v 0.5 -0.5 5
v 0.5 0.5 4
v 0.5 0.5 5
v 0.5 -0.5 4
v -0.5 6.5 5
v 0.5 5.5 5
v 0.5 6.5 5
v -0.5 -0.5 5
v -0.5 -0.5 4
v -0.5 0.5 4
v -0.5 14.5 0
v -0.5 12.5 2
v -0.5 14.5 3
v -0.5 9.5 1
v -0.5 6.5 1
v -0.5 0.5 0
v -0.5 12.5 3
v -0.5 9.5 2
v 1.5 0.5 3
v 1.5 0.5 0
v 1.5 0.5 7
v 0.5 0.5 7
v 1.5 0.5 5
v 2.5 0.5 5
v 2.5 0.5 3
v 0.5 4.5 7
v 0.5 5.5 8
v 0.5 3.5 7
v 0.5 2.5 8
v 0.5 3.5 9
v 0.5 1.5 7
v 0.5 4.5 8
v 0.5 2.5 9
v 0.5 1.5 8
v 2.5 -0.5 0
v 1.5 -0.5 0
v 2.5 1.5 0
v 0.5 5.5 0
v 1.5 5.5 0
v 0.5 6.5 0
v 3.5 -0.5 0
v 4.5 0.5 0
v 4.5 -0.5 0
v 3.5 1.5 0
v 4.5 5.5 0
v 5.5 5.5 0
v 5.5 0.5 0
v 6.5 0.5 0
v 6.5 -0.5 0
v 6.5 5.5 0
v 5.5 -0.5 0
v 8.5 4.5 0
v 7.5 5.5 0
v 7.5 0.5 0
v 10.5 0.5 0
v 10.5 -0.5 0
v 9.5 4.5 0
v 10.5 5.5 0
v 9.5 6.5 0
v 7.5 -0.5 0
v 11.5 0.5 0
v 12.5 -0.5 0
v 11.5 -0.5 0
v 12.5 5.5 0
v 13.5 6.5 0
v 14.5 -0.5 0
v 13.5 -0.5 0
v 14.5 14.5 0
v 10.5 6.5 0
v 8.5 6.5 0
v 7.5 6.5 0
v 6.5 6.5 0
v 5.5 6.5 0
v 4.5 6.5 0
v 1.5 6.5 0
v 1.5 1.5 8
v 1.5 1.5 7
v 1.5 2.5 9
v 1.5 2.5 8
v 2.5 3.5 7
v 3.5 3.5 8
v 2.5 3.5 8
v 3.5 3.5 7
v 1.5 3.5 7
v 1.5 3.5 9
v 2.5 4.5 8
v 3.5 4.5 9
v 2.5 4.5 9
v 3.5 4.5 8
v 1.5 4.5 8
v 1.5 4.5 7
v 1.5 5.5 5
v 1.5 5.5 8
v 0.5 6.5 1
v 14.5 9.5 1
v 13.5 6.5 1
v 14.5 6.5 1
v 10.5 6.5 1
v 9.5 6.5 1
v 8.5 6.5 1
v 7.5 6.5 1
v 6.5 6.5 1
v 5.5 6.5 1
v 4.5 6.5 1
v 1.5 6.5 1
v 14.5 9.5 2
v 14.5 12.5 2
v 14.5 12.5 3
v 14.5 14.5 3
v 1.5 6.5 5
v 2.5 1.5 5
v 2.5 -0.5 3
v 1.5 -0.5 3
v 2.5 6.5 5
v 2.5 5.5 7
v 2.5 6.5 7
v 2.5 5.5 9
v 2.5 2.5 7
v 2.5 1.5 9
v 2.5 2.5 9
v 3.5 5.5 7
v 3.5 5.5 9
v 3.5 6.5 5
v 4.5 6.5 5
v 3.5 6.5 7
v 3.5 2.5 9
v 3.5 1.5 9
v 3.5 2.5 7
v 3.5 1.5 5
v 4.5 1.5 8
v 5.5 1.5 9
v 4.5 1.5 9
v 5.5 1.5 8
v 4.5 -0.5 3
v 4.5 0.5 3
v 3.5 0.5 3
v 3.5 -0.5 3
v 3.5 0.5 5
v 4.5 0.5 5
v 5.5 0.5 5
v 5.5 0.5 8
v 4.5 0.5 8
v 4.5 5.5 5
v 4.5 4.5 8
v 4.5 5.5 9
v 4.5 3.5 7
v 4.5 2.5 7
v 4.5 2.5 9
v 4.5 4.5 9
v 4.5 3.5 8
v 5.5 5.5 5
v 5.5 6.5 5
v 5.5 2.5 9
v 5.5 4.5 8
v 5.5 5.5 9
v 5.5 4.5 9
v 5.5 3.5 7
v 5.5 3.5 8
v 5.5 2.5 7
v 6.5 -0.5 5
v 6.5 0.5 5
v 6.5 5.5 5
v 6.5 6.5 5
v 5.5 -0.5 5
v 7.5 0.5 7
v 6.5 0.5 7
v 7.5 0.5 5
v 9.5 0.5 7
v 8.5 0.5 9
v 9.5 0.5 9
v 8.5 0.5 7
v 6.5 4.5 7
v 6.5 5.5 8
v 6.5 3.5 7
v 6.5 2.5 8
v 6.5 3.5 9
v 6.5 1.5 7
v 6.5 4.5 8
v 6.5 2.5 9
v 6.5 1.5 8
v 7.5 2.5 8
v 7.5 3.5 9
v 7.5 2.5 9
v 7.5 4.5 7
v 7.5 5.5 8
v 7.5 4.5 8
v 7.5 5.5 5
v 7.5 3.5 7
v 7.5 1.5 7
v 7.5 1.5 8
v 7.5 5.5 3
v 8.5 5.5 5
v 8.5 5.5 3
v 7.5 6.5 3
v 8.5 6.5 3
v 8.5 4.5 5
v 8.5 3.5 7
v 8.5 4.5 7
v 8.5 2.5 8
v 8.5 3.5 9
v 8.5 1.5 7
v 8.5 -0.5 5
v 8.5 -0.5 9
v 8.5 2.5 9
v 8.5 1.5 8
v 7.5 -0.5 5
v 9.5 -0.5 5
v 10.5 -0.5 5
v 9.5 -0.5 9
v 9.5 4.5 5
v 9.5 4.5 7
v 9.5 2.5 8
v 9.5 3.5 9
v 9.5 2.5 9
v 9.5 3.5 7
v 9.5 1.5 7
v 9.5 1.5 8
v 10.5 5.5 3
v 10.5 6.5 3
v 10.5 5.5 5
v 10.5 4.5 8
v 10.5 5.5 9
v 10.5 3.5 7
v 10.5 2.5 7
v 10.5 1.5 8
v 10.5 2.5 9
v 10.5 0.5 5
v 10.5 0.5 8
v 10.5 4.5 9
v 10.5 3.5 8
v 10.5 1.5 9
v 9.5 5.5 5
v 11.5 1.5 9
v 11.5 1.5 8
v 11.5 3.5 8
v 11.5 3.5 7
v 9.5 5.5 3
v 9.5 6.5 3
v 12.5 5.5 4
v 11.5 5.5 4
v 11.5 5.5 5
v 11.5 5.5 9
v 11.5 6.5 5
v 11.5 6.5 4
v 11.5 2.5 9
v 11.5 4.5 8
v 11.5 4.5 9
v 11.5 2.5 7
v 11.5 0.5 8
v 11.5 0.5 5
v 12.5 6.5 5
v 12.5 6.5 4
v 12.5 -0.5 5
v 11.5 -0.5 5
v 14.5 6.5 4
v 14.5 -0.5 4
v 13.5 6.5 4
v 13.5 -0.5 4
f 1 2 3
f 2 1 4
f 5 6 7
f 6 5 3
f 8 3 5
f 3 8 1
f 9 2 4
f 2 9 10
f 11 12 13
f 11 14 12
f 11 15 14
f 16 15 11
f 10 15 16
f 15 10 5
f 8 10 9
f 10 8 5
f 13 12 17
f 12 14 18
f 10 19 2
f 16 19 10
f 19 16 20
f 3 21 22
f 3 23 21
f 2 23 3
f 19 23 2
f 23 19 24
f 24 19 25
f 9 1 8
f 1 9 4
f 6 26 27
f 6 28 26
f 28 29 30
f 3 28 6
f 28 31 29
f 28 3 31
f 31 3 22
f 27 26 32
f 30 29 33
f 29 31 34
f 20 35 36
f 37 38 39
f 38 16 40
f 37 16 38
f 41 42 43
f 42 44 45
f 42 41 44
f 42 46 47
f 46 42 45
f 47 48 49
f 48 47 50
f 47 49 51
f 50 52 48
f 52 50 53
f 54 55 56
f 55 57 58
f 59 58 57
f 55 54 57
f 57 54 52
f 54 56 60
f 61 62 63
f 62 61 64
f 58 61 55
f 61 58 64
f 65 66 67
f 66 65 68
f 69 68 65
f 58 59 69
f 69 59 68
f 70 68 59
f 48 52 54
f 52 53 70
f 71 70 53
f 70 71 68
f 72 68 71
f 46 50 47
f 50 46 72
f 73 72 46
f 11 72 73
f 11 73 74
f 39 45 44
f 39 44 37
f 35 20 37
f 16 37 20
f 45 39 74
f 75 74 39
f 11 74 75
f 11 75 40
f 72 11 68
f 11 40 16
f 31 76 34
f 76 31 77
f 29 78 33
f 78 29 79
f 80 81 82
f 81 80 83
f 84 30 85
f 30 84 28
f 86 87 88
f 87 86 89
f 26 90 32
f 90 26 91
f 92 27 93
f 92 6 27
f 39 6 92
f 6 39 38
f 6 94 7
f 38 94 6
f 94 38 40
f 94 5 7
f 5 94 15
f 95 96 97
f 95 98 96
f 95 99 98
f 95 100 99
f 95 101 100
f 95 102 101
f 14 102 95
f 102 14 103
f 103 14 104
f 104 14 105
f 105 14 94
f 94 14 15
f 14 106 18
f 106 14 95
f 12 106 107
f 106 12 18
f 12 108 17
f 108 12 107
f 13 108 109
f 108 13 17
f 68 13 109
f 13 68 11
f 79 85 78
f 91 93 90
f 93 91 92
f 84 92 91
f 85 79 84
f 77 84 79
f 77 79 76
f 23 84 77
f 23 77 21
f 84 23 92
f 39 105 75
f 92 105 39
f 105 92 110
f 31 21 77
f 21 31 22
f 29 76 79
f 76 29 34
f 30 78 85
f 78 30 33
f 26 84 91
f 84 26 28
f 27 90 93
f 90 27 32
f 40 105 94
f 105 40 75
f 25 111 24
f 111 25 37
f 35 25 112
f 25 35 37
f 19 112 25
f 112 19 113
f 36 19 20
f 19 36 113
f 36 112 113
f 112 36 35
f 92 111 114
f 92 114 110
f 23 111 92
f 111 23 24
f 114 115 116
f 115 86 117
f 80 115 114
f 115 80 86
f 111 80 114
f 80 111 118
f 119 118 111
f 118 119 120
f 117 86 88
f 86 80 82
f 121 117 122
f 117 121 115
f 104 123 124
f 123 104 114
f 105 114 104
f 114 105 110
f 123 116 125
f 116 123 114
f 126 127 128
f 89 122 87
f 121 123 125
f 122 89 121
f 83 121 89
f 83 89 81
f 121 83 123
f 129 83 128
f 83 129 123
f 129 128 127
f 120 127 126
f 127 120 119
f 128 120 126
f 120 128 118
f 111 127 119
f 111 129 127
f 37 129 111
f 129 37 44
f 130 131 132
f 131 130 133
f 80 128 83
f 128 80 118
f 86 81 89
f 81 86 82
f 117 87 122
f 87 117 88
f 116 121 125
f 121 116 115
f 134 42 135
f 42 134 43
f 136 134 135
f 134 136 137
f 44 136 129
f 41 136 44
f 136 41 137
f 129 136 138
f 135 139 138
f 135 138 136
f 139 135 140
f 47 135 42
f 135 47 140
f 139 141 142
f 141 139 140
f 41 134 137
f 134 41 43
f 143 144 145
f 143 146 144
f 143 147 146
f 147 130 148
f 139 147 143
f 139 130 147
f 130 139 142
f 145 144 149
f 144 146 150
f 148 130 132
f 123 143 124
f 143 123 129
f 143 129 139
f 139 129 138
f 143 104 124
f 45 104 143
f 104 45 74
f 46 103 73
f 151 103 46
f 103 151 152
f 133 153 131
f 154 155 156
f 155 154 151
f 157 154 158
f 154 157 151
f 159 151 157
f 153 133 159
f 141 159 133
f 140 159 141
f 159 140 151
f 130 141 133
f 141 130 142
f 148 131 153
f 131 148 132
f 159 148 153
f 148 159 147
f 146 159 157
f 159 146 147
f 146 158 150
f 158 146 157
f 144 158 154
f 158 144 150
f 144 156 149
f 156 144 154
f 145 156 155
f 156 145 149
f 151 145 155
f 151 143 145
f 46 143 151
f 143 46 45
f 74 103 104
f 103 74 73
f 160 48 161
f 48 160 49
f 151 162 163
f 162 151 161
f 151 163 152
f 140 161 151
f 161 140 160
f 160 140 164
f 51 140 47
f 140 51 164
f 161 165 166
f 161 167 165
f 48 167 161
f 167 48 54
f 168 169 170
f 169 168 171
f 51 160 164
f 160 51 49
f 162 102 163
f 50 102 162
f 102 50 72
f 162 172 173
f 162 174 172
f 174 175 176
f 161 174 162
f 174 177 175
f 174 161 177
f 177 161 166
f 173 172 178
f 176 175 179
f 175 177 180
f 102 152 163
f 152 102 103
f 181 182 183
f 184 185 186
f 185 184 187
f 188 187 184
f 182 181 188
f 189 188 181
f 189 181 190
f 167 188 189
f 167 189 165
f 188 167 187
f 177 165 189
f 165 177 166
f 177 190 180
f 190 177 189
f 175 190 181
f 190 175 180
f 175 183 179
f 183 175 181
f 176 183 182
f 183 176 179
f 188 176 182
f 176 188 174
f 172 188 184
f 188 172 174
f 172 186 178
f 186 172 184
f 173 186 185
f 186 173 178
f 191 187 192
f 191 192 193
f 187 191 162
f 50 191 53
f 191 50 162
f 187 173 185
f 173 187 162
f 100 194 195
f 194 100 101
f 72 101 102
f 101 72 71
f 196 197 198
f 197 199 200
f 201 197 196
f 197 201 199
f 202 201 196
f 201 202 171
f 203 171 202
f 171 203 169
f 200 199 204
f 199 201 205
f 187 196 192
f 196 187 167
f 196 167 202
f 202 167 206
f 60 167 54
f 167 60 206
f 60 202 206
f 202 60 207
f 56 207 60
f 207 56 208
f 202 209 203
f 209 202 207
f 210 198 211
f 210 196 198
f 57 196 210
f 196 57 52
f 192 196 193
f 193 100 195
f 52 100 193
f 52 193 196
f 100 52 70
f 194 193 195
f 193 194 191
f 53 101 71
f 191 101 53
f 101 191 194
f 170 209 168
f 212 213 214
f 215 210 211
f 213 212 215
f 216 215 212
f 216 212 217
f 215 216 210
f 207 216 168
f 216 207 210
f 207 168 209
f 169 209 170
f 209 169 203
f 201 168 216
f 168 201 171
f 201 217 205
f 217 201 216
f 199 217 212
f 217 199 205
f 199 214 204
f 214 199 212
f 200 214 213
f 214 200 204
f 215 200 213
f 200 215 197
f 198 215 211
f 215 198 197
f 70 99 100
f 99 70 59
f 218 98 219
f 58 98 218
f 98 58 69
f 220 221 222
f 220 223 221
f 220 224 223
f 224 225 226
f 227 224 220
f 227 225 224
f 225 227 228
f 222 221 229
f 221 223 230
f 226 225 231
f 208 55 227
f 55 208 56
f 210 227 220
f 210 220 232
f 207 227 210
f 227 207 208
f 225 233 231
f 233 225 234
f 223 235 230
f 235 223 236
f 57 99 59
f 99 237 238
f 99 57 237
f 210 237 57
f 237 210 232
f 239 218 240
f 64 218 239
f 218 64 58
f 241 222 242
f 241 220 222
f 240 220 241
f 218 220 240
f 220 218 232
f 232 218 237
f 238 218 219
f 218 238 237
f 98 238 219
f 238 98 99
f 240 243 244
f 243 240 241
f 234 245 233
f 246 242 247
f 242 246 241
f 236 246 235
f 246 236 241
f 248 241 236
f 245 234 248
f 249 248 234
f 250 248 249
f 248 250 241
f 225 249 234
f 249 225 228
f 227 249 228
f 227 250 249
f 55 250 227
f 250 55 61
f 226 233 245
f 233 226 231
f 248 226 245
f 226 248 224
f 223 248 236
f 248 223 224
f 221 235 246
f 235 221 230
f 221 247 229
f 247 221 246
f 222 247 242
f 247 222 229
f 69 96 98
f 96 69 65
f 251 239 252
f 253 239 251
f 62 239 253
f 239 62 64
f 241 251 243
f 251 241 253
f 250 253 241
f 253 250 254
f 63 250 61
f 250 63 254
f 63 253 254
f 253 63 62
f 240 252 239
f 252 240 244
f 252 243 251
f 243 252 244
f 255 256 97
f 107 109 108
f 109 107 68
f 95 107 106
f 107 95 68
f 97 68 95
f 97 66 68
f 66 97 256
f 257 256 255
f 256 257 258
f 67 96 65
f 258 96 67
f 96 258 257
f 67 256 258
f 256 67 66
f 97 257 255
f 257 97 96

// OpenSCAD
union() {
    translate([0, 0, 4.5]) color([1, 0, 0]) cube([1, 1, 1], center=true);
    translate([0, 1, 2.5]) cube([1, 1, 5], center=true);
    translate([0, 2, 2.5]) cube([1, 1, 5], center=true);
    translate([0, 3, 2.5]) cube([1, 1, 5], center=true);
    translate([0, 4, 2.5]) cube([1, 1, 5], center=true);
    translate([0, 5, 2.5]) cube([1, 1, 5], center=true);
    translate([0, 6, 2.5]) cube([1, 1, 5], center=true);
    translate([0, 7, 0.5]) cube([1, 1, 1], center=true);
    translate([0, 8, 0.5]) cube([1, 1, 1], center=true);
    translate([0, 9, 0.5]) cube([1, 1, 1], center=true);
    translate([0, 10, 1.0]) cube([1, 1, 2], center=true);
    translate([0, 11, 1.0]) cube([1, 1, 2], center=true);
    translate([0, 12, 1.0]) cube([1, 1, 2], center=true);
    translate([0, 13, 1.5]) cube([1, 1, 3], center=true);
    translate([0, 14, 1.5]) cube([1, 1, 3], center=true);
    translate([1, 1, 3.5]) cube([1, 1, 7], center=true);
    translate([1, 2, 4.0]) cube([1, 1, 8], center=true);
    translate([1, 3, 4.5]) cube([1, 1, 9], center=true);
    translate([1, 4, 3.5]) cube([1, 1, 7], center=true);
    translate([1, 5, 4.0]) cube([1, 1, 8], center=true);
    translate([1, 7, 0.5]) cube([1, 1, 1], center=true);
    translate([1, 8, 0.5]) cube([1, 1, 1], center=true);
    translate([1, 9, 0.5]) cube([1, 1, 1], center=true);
    translate([1, 10, 1.0]) cube([1, 1, 2], center=true);
    translate([1, 11, 1.0]) cube([1, 1, 2], center=true);
    translate([1, 12, 1.0]) cube([1, 1, 2], center=true);
    translate([1, 13, 1.5]) cube([1, 1, 3], center=true);
    translate([1, 14, 1.5]) cube([1, 1, 3], center=true);
    translate([2, 0, 1.5]) cube([1, 1, 3], center=true);
    translate([2, 1, 2.5]) cube([1, 1, 5], center=true);
    translate([2, 2, 2.5]) cube([1, 1, 5], center=true);
    translate([2, 3, 2.5]) cube([1, 1, 5], center=true);
    translate([2, 4, 2.5]) cube([1, 1, 5], center=true);
    translate([2, 5, 2.5]) cube([1, 1, 5], center=true);
    translate([2, 6, 2.5]) cube([1, 1, 5], center=true);
    translate([2, 7, 0.5]) cube([1, 1, 1], center=true);
    translate([2, 8, 0.5]) cube([1, 1, 1], center=true);
    translate([2, 9, 0.5]) cube([1, 1, 1], center=true);
    translate([2, 10, 1.0]) cube([1, 1, 2], center=true);
    translate([2, 11, 1.0]) cube([1, 1, 2], center=true);
    translate([2, 12, 1.0]) cube([1, 1, 2], center=true);
    translate([2, 13, 1.5]) cube([1, 1, 3], center=true);
    translate([2, 14, 1.5]) cube([1, 1, 3], center=true);
    translate([3, 2, 4.5]) cube([1, 1, 9], center=true);
    translate([3, 3, 3.5]) cube([1, 1, 7], center=true);
    translate([3, 4, 4.0]) cube([1, 1, 8], center=true);
    translate([3, 5, 4.5]) cube([1, 1, 9], center=true);
    translate([3, 6, 3.5]) cube([1, 1, 7], center=true);
    translate([3, 7, 0.5]) cube([1, 1, 1], center=true);
    translate([3, 8, 0.5]) cube([1, 1, 1], center=true);
    translate([3, 9, 0.5]) cube([1, 1, 1], center=true);
    translate([3, 10, 1.0]) cube([1, 1, 2], center=true);
    translate([3, 11, 1.0]) cube([1, 1, 2], center=true);
    translate([3, 12, 1.0]) cube([1, 1, 2], center=true);
    translate([3, 13, 1.5]) cube([1, 1, 3], center=true);
    translate([3, 14, 1.5]) cube([1, 1, 3], center=true);
    translate([4, 0, 1.5]) cube([1, 1, 3], center=true);
    translate([4, 1, 2.5]) cube([1, 1, 5], center=true);
    translate([4, 2, 2.5]) cube([1, 1, 5], center=true);
    translate([4, 3, 2.5]) cube([1, 1, 5], center=true);
    translate([4, 4, 2.5]) cube([1, 1, 5], center=true);
    translate([4, 5, 2.5]) cube([1, 1, 5], center=true);
    translate([4, 6, 2.5]) cube([1, 1, 5], center=true);
    translate([4, 7, 0.5]) cube([1, 1, 1], center=true);
    translate([4, 8, 0.5]) cube([1, 1, 1], center=true);
    translate([4, 9, 0.5]) cube([1, 1, 1], center=true);
    translate([4, 10, 1.0]) cube([1, 1, 2], center=true);
    translate([4, 11, 1.0]) cube([1, 1, 2], center=true);
    translate([4, 12, 1.0]) cube([1, 1, 2], center=true);
    translate([4, 13, 1.5]) cube([1, 1, 3], center=true);
    translate([4, 14, 1.5]) cube([1, 1, 3], center=true);
    translate([5, 1, 4.0]) cube([1, 1, 8], center=true);
    translate([5, 2, 4.5]) cube([1, 1, 9], center=true);
    translate([5, 3, 3.5]) cube([1, 1, 7], center=true);
    translate([5, 4, 4.0]) cube([1, 1, 8], center=true);
    translate([5, 5, 4.5]) cube([1, 1, 9], center=true);
    translate([5, 7, 0.5]) cube([1, 1, 1], center=true);
    translate([5, 8, 0.5]) cube([1, 1, 1], center=true);
    translate([5, 9, 0.5]) cube([1, 1, 1], center=true);
    translate([5, 10, 1.0]) cube([1, 1, 2], center=true);
    translate([5, 11, 1.0]) cube([1, 1, 2], center=true);
    translate([5, 12, 1.0]) cube([1, 1, 2], center=true);
    translate([5, 13, 1.5]) cube([1, 1, 3], center=true);
    translate([5, 14, 1.5]) cube([1, 1, 3], center=true);
    translate([6, 0, 2.5]) cube([1, 1, 5], center=true);
    translate([6, 1, 2.5]) cube([1, 1, 5], center=true);
    translate([6, 2, 2.5]) cube([1, 1, 5], center=true);
    translate([6, 3, 2.5]) cube([1, 1, 5], center=true);
    translate([6, 4, 2.5]) cube([1, 1, 5], center=true);
    translate([6, 5, 2.5]) cube([1, 1, 5], center=true);
    translate([6, 6, 2.5]) cube([1, 1, 5], center=true);
    translate([6, 7, 0.5]) cube([1, 1, 1], center=true);
    translate([6, 8, 0.5]) cube([1, 1, 1], center=true);
    translate([6, 9, 0.5]) cube([1, 1, 1], center=true);
    translate([6, 10, 1.0]) cube([1, 1, 2], center=true);
    translate([6, 11, 1.0]) cube([1, 1, 2], center=true);
    translate([6, 12, 1.0]) cube([1, 1, 2], center=true);
    translate([6, 13, 1.5]) cube([1, 1, 3], center=true);
    translate([6, 14, 1.5]) cube([1, 1, 3], center=true);
    translate([7, 1, 3.5]) cube([1, 1, 7], center=true);
    translate([7, 2, 4.0]) cube([1, 1, 8], center=true);
    translate([7, 3, 4.5]) cube([1, 1, 9], center=true);
    translate([7, 4, 3.5]) cube([1, 1, 7], center=true);
    translate([7, 5, 4.0]) cube([1, 1, 8], center=true);
    translate([7, 7, 0.5]) cube([1, 1, 1], center=true);
    translate([7, 8, 0.5]) cube([1, 1, 1], center=true);
    translate([7, 9, 0.5]) cube([1, 1, 1], center=true);
    translate([7, 10, 1.0]) cube([1, 1, 2], center=true);
    translate([7, 11, 1.0]) cube([1, 1, 2], center=true);
    translate([7, 12, 1.0]) cube([1, 1, 2], center=true);
    translate([7, 13, 1.5]) cube([1, 1, 3], center=true);
    translate([7, 14, 1.5]) cube([1, 1, 3], center=true);
    translate([8, 0, 2.5]) cube([1, 1, 5], center=true);
    translate([8, 1, 2.5]) cube([1, 1, 5], center=true);
    translate([8, 2, 2.5]) cube([1, 1, 5], center=true);
    translate([8, 3, 2.5]) cube([1, 1, 5], center=true);
    translate([8, 4, 2.5]) cube([1, 1, 5], center=true);
    translate([8, 5, 2.5]) cube([1, 1, 5], center=true);
    translate([8, 6, 1.5]) cube([1, 1, 3], center=true);
    translate([8, 7, 0.5]) cube([1, 1, 1], center=true);
    translate([8, 8, 0.5]) cube([1, 1, 1], center=true);
    translate([8, 9, 0.5]) cube([1, 1, 1], center=true);
    translate([8, 10, 1.0]) cube([1, 1, 2], center=true);
    translate([8, 11, 1.0]) cube([1, 1, 2], center=true);
    translate([8, 12, 1.0]) cube([1, 1, 2], center=true);
    translate([8, 13, 1.5]) cube([1, 1, 3], center=true);
    translate([8, 14, 1.5]) cube([1, 1, 3], center=true);
    translate([9, 0, 4.5]) cube([1, 1, 9], center=true);
    translate([9, 1, 3.5]) cube([1, 1, 7], center=true);
    translate([9, 2, 4.0]) cube([1, 1, 8], center=true);
    translate([9, 3, 4.5]) cube([1, 1, 9], center=true);
    translate([9, 4, 3.5]) cube([1, 1, 7], center=true);
    translate([9, 7, 0.5]) cube([1, 1, 1], center=true);
    translate([9, 8, 0.5]) cube([1, 1, 1], center=true);
    translate([9, 9, 0.5]) cube([1, 1, 1], center=true);
    translate([9, 10, 1.0]) cube([1, 1, 2], center=true);
    translate([9, 11, 1.0]) cube([1, 1, 2], center=true);
    translate([9, 12, 1.0]) cube([1, 1, 2], center=true);
    translate([9, 13, 1.5]) cube([1, 1, 3], center=true);
    translate([9, 14, 1.5]) cube([1, 1, 3], center=true);
    translate([10, 0, 2.5]) cube([1, 1, 5], center=true);
    translate([10, 1, 2.5]) cube([1, 1, 5], center=true);
    translate([10, 2, 2.5]) cube([1, 1, 5], center=true);
    translate([10, 3, 2.5]) cube([1, 1, 5], center=true);
    translate([10, 4, 2.5]) cube([1, 1, 5], center=true);
    translate([10, 5, 2.5]) cube([1, 1, 5], center=true);
    translate([10, 6, 1.5]) cube([1, 1, 3], center=true);
    translate([10, 7, 0.5]) cube([1, 1, 1], center=true);
    translate([10, 8, 0.5]) cube([1, 1, 1], center=true);
    translate([10, 9, 0.5]) cube([1, 1, 1], center=true);
    translate([10, 10, 1.0]) cube([1, 1, 2], center=true);
    translate([10, 11, 1.0]) cube([1, 1, 2], center=true);
    translate([10, 12, 1.0]) cube([1, 1, 2], center=true);
    translate([10, 13, 1.5]) cube([1, 1, 3], center=true);
    translate([10, 14, 1.5]) cube([1, 1, 3], center=true);
    translate([11, 1, 4.0]) cube([1, 1, 8], center=true);
    translate([11, 2, 4.5]) cube([1, 1, 9], center=true);
    translate([11, 3, 3.5]) cube([1, 1, 7], center=true);
    translate([11, 4, 4.0]) cube([1, 1, 8], center=true);
    translate([11, 5, 4.5]) cube([1, 1, 9], center=true);
    translate([11, 7, 0.5]) cube([1, 1, 1], center=true);
    translate([11, 8, 0.5]) cube([1, 1, 1], center=true);
    translate([11, 9, 0.5]) cube([1, 1, 1], center=true);
    translate([11, 10, 1.0]) cube([1, 1, 2], center=true);
    translate([11, 11, 1.0]) cube([1, 1, 2], center=true);
    translate([11, 12, 1.0]) cube([1, 1, 2], center=true);
    translate([11, 13, 1.5]) cube([1, 1, 3], center=true);
    translate([11, 14, 1.5]) cube([1, 1, 3], center=true);
    translate([12, 0, 2.5]) cube([1, 1, 5], center=true);
    translate([12, 1, 2.5]) cube([1, 1, 5], center=true);
    translate([12, 2, 2.5]) cube([1, 1, 5], center=true);
    translate([12, 3, 2.5]) cube([1, 1, 5], center=true);
    translate([12, 4, 2.5]) cube([1, 1, 5], center=true);
    translate([12, 5, 2.5]) cube([1, 1, 5], center=true);
    translate([12, 6, 4.5]) color([0, 0, 1]) cube([1, 1, 1], center=true);
    translate([12, 7, 0.5]) cube([1, 1, 1], center=true);
    translate([12, 8, 0.5]) cube([1, 1, 1], center=true);
    translate([12, 9, 0.5]) cube([1, 1, 1], center=true);
    translate([12, 10, 1.0]) cube([1, 1, 2], center=true);
    translate([12, 11, 1.0]) cube([1, 1, 2], center=true);
    translate([12, 12, 1.0]) cube([1, 1, 2], center=true);
    translate([12, 13, 1.5]) cube([1, 1, 3], center=true);
    translate([12, 14, 1.5]) cube([1, 1, 3], center=true);
    translate([13, 7, 0.5]) cube([1, 1, 1], center=true);
    translate([13, 8, 0.5]) cube([1, 1, 1], center=true);
    translate([13, 9, 0.5]) cube([1, 1, 1], center=true);
    translate([13, 10, 1.0]) cube([1, 1, 2], center=true);
    translate([13, 11, 1.0]) cube([1, 1, 2], center=true);
    translate([13, 12, 1.0]) cube([1, 1, 2], center=true);
    translate([13, 13, 1.5]) cube([1, 1, 3], center=true);
    translate([13, 14, 1.5]) cube([1, 1, 3], center=true);
    translate([14, 0, 2.0]) cube([1, 1, 4], center=true);
    translate([14, 1, 2.0]) cube([1, 1, 4], center=true);
    translate([14, 2, 2.0]) cube([1, 1, 4], center=true);
    translate([14, 3, 2.0]) cube([1, 1, 4], center=true);
    translate([14, 4, 2.0]) cube([1, 1, 4], center=true);
    translate([14, 5, 2.0]) cube([1, 1, 4], center=true);
    translate([14, 6, 2.0]) cube([1, 1, 4], center=true);
    translate([14, 7, 0.5]) cube([1, 1, 1], center=true);
    translate([14, 8, 0.5]) cube([1, 1, 1], center=true);
    translate([14, 9, 0.5]) cube([1, 1, 1], center=true);
    translate([14, 10, 1.0]) cube([1, 1, 2], center=true);
    translate([14, 11, 1.0]) cube([1, 1, 2], center=true);
    translate([14, 12, 1.0]) cube([1, 1, 2], center=true);
    translate([14, 13, 1.5]) cube([1, 1, 3], center=true);
    translate([14, 14, 1.5]) cube([1, 1, 3], center=true);
}
